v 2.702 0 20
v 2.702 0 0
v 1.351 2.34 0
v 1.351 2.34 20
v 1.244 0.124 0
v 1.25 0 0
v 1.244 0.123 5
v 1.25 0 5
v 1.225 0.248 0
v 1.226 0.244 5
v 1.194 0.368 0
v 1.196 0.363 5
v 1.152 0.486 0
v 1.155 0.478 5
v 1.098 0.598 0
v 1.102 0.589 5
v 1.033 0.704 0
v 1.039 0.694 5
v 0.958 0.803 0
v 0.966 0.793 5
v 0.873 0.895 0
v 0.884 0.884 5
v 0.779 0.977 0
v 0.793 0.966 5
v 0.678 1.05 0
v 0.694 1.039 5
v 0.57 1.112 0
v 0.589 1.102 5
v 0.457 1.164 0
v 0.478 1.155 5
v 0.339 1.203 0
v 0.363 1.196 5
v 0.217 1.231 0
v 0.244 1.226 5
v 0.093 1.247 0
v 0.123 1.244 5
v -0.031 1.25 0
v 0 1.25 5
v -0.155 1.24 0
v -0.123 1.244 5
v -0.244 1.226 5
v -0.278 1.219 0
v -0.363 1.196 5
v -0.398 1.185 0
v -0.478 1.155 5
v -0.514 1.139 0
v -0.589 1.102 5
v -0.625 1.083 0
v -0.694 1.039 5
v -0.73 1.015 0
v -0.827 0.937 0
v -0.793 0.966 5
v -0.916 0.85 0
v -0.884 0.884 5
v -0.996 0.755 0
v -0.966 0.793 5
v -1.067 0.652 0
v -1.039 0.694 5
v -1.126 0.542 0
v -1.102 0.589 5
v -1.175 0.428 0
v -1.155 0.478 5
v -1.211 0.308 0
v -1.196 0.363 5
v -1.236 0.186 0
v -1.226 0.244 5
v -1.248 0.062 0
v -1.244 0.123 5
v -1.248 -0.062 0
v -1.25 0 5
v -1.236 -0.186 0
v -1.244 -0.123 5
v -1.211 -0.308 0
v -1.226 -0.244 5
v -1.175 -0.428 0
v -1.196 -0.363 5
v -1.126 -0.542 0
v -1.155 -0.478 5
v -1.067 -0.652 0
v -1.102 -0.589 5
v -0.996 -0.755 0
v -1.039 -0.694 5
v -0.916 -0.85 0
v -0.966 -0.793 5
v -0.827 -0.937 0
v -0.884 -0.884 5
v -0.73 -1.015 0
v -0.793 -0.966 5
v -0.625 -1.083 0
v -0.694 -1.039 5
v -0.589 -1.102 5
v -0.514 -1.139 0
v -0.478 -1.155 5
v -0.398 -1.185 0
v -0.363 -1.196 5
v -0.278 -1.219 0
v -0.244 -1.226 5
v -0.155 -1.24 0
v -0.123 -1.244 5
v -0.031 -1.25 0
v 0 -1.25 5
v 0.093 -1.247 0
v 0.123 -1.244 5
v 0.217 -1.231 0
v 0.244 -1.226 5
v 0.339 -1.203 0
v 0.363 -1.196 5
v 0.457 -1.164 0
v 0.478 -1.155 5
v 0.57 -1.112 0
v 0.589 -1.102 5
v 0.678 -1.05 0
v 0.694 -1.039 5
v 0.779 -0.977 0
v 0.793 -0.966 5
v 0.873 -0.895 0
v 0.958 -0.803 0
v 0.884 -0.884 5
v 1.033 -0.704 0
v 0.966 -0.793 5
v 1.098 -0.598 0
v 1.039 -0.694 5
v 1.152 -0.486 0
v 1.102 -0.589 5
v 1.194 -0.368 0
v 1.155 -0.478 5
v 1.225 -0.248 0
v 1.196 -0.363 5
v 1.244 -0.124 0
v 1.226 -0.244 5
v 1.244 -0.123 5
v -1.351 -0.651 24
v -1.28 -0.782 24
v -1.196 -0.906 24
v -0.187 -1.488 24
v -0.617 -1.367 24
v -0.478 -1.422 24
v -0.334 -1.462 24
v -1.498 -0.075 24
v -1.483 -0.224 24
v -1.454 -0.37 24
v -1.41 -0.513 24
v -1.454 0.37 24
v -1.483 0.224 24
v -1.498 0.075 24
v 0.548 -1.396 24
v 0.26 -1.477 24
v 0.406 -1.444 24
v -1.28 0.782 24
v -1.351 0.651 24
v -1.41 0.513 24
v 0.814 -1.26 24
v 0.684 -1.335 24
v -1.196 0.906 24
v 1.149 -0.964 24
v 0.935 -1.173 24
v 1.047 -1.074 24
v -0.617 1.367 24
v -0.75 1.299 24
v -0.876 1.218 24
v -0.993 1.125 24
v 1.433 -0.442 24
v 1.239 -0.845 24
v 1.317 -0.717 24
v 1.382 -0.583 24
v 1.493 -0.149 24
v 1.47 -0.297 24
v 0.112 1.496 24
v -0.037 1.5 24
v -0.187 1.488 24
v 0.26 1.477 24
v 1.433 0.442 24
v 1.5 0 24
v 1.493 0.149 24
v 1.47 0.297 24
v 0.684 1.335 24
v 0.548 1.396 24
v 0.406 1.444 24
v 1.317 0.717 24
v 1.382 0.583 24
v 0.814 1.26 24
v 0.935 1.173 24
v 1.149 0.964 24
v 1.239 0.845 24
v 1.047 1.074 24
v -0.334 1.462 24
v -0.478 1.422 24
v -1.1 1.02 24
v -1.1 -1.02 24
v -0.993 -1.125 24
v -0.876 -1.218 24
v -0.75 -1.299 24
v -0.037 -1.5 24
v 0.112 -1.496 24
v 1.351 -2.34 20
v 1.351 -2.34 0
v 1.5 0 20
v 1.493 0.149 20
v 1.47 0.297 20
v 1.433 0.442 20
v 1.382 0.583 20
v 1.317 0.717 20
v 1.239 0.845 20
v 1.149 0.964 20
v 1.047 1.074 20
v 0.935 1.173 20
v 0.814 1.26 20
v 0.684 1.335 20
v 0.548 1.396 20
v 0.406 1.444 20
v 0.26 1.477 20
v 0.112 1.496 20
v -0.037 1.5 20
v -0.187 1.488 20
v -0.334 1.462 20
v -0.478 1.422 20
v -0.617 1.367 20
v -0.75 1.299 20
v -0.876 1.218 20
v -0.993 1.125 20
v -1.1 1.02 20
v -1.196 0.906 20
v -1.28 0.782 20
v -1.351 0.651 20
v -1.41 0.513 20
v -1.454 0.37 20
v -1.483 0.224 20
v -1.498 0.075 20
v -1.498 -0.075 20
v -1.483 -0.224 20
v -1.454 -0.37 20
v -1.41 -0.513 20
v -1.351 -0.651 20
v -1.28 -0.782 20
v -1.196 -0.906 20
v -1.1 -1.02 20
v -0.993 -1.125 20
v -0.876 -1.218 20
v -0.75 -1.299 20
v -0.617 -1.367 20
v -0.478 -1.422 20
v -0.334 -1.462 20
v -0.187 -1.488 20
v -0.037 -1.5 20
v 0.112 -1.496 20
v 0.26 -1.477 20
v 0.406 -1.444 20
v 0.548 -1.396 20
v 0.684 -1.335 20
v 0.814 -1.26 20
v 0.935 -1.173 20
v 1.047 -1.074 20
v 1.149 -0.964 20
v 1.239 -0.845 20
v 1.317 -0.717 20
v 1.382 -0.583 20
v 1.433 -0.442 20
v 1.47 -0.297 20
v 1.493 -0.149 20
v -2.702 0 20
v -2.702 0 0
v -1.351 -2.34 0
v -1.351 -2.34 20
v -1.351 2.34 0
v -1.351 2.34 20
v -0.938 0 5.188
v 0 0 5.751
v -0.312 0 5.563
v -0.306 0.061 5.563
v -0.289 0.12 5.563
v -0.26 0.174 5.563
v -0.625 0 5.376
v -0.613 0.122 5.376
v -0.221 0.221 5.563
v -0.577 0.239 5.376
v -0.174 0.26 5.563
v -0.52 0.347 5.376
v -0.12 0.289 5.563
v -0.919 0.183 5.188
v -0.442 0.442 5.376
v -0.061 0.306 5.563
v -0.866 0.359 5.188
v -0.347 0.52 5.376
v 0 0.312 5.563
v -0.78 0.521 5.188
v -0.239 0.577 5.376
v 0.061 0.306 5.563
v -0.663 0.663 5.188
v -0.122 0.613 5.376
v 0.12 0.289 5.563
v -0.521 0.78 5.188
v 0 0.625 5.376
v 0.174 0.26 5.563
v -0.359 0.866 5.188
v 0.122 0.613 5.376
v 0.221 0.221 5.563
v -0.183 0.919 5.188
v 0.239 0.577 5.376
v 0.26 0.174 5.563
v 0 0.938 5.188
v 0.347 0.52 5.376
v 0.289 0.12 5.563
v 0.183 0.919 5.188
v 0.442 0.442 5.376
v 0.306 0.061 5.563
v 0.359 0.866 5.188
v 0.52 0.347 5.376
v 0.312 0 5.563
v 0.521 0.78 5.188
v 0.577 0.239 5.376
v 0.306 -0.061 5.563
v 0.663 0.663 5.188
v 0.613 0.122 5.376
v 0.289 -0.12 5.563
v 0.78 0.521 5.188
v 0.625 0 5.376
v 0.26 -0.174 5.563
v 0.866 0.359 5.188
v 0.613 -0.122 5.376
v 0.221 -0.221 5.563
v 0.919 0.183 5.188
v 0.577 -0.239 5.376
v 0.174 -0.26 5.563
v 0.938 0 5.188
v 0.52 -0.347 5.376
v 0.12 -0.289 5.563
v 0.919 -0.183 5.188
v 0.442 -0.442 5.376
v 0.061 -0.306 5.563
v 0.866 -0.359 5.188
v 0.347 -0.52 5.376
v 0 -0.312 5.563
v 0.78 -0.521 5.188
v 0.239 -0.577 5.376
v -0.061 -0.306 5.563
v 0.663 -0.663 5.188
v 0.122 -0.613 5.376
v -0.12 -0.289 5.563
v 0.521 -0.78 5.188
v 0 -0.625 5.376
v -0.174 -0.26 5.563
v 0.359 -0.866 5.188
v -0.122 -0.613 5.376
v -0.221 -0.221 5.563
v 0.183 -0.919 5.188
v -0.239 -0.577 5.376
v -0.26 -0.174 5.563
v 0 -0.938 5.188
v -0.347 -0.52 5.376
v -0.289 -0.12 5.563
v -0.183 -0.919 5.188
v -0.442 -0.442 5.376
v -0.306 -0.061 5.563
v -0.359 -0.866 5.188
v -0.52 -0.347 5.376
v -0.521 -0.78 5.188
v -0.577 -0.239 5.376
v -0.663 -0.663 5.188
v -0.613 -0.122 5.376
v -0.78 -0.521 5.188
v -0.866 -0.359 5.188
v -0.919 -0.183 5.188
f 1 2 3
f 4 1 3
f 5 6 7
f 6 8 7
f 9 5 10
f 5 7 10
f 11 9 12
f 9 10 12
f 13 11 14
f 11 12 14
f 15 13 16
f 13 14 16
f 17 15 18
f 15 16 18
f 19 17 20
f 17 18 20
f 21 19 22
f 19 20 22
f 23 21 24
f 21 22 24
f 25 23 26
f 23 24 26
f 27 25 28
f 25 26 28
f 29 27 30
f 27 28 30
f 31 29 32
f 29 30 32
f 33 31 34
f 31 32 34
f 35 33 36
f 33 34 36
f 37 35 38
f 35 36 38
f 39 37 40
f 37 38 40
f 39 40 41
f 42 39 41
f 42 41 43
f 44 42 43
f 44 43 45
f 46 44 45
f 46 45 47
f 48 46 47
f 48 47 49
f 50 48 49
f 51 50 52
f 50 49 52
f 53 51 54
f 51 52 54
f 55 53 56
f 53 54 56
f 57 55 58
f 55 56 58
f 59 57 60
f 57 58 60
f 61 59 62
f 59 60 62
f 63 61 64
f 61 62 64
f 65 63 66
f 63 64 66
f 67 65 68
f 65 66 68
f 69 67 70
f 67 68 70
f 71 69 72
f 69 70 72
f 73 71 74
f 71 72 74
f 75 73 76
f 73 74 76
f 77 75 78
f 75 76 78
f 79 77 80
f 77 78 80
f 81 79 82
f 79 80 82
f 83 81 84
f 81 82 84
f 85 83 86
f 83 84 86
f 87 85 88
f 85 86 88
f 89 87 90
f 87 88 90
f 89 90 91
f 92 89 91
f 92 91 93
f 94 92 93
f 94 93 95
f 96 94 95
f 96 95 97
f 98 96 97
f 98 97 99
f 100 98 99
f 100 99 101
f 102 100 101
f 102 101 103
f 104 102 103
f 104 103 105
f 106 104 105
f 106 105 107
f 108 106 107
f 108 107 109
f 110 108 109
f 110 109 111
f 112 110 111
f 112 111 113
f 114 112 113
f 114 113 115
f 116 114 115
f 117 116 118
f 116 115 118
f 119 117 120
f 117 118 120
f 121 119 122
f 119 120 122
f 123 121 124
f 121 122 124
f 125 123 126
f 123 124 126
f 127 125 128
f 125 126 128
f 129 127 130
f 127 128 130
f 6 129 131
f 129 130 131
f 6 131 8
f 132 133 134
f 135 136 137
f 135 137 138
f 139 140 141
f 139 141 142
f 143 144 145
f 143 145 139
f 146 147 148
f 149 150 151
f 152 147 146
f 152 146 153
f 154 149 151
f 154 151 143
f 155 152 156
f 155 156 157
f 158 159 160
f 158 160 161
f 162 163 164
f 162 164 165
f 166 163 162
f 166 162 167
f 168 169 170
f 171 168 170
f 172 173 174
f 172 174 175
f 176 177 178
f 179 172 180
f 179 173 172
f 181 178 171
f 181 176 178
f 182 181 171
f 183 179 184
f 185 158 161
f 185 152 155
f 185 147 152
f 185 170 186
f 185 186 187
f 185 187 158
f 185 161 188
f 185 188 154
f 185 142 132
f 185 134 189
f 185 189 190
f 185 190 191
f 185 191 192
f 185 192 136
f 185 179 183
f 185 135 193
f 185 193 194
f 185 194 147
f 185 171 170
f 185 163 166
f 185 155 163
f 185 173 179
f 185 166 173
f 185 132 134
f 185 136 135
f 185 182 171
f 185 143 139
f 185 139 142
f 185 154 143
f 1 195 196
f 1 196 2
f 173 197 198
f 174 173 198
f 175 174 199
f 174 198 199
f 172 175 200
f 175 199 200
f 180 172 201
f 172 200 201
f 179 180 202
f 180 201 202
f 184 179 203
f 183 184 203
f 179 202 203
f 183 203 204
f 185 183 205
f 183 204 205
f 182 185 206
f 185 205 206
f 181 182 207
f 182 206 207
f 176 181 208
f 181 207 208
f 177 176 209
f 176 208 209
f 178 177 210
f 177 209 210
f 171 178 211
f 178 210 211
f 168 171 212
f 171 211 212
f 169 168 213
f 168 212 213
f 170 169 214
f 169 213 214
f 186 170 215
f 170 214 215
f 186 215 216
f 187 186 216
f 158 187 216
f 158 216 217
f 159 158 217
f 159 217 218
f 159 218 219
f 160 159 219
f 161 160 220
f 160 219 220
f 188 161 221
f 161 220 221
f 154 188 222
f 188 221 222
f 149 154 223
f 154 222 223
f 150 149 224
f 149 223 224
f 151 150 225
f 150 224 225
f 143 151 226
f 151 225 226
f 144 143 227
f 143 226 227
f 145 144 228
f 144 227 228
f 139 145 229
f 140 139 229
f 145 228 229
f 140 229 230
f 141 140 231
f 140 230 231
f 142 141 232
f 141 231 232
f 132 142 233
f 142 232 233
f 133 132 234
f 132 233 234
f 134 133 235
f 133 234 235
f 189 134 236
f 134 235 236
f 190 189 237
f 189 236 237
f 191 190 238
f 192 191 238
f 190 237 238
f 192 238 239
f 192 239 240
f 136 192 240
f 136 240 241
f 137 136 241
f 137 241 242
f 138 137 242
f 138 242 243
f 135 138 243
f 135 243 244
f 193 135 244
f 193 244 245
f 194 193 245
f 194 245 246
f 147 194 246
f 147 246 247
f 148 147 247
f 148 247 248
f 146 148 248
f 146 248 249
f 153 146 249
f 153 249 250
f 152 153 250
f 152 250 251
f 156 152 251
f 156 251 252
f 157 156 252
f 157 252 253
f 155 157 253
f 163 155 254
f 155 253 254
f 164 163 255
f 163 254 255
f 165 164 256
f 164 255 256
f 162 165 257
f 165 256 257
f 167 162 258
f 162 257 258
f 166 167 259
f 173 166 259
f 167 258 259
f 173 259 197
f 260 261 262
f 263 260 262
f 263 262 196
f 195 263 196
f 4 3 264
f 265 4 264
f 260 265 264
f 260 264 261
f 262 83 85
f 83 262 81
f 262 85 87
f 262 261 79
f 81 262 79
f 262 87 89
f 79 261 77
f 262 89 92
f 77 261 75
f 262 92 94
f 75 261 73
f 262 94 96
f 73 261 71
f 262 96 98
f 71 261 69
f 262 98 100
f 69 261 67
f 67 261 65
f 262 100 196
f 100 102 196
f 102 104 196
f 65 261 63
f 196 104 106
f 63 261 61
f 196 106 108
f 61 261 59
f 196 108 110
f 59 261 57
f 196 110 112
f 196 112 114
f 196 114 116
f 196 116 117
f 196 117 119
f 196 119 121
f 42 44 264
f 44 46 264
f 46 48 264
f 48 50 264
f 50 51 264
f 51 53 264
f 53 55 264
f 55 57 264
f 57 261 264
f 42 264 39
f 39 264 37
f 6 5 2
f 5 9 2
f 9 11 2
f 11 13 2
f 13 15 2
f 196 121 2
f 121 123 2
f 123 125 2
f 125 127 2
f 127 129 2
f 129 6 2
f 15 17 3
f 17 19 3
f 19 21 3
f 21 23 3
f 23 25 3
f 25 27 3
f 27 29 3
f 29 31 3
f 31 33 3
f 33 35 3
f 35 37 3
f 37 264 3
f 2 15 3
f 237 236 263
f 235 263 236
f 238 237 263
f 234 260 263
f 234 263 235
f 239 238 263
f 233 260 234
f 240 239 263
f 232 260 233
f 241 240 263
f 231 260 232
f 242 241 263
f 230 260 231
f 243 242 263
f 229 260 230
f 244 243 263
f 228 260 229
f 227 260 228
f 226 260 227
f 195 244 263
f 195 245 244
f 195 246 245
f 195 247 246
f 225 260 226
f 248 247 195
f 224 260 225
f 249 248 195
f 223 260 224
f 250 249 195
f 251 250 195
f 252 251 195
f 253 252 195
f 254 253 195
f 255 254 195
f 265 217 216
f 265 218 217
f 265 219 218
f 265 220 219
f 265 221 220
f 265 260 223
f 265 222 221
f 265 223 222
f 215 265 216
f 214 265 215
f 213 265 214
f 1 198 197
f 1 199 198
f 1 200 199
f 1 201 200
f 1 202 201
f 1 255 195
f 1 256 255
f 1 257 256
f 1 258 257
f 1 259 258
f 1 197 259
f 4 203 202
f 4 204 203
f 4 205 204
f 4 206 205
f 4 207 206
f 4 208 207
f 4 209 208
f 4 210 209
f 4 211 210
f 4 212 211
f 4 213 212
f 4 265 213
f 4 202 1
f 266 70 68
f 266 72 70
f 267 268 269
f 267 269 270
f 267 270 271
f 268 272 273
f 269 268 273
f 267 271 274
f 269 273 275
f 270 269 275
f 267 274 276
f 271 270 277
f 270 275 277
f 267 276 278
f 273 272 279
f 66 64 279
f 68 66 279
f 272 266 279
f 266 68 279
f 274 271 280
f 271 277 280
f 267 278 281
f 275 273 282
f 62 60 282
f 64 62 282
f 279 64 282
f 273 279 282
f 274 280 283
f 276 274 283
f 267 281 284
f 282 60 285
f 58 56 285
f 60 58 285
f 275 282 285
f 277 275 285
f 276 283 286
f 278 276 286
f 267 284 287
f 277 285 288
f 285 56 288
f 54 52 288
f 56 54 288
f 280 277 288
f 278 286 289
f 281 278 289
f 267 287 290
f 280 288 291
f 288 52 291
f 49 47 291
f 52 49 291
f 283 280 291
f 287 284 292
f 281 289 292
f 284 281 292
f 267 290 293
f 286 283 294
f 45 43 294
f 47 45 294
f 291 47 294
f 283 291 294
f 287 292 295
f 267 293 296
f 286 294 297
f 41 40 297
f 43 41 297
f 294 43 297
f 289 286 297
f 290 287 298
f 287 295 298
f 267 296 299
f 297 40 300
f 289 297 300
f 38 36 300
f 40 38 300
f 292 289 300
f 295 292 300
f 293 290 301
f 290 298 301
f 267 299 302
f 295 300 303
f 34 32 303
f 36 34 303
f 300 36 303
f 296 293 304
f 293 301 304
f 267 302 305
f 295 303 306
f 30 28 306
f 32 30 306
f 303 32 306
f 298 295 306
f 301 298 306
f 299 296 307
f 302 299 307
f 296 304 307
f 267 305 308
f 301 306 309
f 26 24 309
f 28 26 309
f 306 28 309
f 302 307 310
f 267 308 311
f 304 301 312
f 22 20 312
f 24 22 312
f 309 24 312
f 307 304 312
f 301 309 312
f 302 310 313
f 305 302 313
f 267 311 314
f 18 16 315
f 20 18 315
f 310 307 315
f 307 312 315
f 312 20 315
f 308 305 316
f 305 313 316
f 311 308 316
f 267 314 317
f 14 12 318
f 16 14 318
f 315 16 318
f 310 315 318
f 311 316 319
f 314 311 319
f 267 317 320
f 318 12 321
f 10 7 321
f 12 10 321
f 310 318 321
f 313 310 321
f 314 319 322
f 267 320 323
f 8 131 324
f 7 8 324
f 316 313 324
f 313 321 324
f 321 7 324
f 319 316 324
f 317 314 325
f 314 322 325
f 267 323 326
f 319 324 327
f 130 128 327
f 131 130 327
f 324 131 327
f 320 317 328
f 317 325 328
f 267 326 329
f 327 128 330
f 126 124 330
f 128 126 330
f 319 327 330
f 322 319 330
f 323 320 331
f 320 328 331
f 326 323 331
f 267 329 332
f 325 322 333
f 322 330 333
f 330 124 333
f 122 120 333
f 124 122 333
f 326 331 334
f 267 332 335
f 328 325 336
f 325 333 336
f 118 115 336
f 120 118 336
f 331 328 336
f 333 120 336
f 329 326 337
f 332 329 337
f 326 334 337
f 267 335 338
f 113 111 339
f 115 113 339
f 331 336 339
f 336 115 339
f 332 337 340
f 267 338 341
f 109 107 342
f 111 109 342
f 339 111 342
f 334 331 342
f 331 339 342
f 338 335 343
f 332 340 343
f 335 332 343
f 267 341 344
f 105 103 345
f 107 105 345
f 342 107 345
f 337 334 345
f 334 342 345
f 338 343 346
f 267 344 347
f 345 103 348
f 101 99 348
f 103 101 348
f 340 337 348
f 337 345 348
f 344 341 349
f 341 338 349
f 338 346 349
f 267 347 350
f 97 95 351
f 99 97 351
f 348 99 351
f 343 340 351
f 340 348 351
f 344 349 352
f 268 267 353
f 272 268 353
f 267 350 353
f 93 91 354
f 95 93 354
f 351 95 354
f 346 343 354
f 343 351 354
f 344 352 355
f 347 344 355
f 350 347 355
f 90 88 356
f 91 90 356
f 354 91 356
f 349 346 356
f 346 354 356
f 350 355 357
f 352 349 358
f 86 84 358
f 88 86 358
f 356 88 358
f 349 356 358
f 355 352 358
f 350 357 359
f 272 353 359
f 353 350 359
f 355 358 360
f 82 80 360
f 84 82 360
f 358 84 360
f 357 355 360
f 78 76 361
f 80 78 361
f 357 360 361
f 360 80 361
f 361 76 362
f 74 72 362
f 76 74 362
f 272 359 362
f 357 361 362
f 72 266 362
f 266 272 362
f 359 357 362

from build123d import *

# Parameters (mm, degrees)
EXTRUDE_1_DEPTH = 20
SKETCH_2_R      = 1.5
EXTRUDE_2_DEPTH = 4
M3X0_5_1_D      = 2.5
M3X0_5_1_DEPTH  = 5
M3X0_5_1_TIP    = 0.751075774


with BuildPart() as part:
    # 草圖1 → 填料-伸長1 (new body)
    with BuildSketch(Plane.XY):
        Polygon((2.70199926, 0), (1.35099963, 2.34), (-1.35099963, 2.34), (-2.70199926, 0), (-1.35099963, -2.34), (1.35099963, -2.34), align=None)
    extrude(amount=EXTRUDE_1_DEPTH)

    # 草圖2 → 填料-伸長2 (add)
    with BuildSketch(Plane.XY.offset(20)):
        Circle(SKETCH_2_R)
    extrude(amount=EXTRUDE_2_DEPTH)

    # M3x0.5 螺紋孔1
    with Locations(Plane(origin=(0, 0, 0), x_dir=(-1, 0, 0), z_dir=(0, 0, -1))):
        with Locations((0, 0)):
            Hole(M3X0_5_1_D / 2, depth=M3X0_5_1_DEPTH)
            with Locations((0, 0, -(M3X0_5_1_DEPTH + M3X0_5_1_TIP / 2))):  # 118° drill point
                Cone(0, M3X0_5_1_D / 2, M3X0_5_1_TIP, mode=Mode.SUBTRACT)


solid = part.part
